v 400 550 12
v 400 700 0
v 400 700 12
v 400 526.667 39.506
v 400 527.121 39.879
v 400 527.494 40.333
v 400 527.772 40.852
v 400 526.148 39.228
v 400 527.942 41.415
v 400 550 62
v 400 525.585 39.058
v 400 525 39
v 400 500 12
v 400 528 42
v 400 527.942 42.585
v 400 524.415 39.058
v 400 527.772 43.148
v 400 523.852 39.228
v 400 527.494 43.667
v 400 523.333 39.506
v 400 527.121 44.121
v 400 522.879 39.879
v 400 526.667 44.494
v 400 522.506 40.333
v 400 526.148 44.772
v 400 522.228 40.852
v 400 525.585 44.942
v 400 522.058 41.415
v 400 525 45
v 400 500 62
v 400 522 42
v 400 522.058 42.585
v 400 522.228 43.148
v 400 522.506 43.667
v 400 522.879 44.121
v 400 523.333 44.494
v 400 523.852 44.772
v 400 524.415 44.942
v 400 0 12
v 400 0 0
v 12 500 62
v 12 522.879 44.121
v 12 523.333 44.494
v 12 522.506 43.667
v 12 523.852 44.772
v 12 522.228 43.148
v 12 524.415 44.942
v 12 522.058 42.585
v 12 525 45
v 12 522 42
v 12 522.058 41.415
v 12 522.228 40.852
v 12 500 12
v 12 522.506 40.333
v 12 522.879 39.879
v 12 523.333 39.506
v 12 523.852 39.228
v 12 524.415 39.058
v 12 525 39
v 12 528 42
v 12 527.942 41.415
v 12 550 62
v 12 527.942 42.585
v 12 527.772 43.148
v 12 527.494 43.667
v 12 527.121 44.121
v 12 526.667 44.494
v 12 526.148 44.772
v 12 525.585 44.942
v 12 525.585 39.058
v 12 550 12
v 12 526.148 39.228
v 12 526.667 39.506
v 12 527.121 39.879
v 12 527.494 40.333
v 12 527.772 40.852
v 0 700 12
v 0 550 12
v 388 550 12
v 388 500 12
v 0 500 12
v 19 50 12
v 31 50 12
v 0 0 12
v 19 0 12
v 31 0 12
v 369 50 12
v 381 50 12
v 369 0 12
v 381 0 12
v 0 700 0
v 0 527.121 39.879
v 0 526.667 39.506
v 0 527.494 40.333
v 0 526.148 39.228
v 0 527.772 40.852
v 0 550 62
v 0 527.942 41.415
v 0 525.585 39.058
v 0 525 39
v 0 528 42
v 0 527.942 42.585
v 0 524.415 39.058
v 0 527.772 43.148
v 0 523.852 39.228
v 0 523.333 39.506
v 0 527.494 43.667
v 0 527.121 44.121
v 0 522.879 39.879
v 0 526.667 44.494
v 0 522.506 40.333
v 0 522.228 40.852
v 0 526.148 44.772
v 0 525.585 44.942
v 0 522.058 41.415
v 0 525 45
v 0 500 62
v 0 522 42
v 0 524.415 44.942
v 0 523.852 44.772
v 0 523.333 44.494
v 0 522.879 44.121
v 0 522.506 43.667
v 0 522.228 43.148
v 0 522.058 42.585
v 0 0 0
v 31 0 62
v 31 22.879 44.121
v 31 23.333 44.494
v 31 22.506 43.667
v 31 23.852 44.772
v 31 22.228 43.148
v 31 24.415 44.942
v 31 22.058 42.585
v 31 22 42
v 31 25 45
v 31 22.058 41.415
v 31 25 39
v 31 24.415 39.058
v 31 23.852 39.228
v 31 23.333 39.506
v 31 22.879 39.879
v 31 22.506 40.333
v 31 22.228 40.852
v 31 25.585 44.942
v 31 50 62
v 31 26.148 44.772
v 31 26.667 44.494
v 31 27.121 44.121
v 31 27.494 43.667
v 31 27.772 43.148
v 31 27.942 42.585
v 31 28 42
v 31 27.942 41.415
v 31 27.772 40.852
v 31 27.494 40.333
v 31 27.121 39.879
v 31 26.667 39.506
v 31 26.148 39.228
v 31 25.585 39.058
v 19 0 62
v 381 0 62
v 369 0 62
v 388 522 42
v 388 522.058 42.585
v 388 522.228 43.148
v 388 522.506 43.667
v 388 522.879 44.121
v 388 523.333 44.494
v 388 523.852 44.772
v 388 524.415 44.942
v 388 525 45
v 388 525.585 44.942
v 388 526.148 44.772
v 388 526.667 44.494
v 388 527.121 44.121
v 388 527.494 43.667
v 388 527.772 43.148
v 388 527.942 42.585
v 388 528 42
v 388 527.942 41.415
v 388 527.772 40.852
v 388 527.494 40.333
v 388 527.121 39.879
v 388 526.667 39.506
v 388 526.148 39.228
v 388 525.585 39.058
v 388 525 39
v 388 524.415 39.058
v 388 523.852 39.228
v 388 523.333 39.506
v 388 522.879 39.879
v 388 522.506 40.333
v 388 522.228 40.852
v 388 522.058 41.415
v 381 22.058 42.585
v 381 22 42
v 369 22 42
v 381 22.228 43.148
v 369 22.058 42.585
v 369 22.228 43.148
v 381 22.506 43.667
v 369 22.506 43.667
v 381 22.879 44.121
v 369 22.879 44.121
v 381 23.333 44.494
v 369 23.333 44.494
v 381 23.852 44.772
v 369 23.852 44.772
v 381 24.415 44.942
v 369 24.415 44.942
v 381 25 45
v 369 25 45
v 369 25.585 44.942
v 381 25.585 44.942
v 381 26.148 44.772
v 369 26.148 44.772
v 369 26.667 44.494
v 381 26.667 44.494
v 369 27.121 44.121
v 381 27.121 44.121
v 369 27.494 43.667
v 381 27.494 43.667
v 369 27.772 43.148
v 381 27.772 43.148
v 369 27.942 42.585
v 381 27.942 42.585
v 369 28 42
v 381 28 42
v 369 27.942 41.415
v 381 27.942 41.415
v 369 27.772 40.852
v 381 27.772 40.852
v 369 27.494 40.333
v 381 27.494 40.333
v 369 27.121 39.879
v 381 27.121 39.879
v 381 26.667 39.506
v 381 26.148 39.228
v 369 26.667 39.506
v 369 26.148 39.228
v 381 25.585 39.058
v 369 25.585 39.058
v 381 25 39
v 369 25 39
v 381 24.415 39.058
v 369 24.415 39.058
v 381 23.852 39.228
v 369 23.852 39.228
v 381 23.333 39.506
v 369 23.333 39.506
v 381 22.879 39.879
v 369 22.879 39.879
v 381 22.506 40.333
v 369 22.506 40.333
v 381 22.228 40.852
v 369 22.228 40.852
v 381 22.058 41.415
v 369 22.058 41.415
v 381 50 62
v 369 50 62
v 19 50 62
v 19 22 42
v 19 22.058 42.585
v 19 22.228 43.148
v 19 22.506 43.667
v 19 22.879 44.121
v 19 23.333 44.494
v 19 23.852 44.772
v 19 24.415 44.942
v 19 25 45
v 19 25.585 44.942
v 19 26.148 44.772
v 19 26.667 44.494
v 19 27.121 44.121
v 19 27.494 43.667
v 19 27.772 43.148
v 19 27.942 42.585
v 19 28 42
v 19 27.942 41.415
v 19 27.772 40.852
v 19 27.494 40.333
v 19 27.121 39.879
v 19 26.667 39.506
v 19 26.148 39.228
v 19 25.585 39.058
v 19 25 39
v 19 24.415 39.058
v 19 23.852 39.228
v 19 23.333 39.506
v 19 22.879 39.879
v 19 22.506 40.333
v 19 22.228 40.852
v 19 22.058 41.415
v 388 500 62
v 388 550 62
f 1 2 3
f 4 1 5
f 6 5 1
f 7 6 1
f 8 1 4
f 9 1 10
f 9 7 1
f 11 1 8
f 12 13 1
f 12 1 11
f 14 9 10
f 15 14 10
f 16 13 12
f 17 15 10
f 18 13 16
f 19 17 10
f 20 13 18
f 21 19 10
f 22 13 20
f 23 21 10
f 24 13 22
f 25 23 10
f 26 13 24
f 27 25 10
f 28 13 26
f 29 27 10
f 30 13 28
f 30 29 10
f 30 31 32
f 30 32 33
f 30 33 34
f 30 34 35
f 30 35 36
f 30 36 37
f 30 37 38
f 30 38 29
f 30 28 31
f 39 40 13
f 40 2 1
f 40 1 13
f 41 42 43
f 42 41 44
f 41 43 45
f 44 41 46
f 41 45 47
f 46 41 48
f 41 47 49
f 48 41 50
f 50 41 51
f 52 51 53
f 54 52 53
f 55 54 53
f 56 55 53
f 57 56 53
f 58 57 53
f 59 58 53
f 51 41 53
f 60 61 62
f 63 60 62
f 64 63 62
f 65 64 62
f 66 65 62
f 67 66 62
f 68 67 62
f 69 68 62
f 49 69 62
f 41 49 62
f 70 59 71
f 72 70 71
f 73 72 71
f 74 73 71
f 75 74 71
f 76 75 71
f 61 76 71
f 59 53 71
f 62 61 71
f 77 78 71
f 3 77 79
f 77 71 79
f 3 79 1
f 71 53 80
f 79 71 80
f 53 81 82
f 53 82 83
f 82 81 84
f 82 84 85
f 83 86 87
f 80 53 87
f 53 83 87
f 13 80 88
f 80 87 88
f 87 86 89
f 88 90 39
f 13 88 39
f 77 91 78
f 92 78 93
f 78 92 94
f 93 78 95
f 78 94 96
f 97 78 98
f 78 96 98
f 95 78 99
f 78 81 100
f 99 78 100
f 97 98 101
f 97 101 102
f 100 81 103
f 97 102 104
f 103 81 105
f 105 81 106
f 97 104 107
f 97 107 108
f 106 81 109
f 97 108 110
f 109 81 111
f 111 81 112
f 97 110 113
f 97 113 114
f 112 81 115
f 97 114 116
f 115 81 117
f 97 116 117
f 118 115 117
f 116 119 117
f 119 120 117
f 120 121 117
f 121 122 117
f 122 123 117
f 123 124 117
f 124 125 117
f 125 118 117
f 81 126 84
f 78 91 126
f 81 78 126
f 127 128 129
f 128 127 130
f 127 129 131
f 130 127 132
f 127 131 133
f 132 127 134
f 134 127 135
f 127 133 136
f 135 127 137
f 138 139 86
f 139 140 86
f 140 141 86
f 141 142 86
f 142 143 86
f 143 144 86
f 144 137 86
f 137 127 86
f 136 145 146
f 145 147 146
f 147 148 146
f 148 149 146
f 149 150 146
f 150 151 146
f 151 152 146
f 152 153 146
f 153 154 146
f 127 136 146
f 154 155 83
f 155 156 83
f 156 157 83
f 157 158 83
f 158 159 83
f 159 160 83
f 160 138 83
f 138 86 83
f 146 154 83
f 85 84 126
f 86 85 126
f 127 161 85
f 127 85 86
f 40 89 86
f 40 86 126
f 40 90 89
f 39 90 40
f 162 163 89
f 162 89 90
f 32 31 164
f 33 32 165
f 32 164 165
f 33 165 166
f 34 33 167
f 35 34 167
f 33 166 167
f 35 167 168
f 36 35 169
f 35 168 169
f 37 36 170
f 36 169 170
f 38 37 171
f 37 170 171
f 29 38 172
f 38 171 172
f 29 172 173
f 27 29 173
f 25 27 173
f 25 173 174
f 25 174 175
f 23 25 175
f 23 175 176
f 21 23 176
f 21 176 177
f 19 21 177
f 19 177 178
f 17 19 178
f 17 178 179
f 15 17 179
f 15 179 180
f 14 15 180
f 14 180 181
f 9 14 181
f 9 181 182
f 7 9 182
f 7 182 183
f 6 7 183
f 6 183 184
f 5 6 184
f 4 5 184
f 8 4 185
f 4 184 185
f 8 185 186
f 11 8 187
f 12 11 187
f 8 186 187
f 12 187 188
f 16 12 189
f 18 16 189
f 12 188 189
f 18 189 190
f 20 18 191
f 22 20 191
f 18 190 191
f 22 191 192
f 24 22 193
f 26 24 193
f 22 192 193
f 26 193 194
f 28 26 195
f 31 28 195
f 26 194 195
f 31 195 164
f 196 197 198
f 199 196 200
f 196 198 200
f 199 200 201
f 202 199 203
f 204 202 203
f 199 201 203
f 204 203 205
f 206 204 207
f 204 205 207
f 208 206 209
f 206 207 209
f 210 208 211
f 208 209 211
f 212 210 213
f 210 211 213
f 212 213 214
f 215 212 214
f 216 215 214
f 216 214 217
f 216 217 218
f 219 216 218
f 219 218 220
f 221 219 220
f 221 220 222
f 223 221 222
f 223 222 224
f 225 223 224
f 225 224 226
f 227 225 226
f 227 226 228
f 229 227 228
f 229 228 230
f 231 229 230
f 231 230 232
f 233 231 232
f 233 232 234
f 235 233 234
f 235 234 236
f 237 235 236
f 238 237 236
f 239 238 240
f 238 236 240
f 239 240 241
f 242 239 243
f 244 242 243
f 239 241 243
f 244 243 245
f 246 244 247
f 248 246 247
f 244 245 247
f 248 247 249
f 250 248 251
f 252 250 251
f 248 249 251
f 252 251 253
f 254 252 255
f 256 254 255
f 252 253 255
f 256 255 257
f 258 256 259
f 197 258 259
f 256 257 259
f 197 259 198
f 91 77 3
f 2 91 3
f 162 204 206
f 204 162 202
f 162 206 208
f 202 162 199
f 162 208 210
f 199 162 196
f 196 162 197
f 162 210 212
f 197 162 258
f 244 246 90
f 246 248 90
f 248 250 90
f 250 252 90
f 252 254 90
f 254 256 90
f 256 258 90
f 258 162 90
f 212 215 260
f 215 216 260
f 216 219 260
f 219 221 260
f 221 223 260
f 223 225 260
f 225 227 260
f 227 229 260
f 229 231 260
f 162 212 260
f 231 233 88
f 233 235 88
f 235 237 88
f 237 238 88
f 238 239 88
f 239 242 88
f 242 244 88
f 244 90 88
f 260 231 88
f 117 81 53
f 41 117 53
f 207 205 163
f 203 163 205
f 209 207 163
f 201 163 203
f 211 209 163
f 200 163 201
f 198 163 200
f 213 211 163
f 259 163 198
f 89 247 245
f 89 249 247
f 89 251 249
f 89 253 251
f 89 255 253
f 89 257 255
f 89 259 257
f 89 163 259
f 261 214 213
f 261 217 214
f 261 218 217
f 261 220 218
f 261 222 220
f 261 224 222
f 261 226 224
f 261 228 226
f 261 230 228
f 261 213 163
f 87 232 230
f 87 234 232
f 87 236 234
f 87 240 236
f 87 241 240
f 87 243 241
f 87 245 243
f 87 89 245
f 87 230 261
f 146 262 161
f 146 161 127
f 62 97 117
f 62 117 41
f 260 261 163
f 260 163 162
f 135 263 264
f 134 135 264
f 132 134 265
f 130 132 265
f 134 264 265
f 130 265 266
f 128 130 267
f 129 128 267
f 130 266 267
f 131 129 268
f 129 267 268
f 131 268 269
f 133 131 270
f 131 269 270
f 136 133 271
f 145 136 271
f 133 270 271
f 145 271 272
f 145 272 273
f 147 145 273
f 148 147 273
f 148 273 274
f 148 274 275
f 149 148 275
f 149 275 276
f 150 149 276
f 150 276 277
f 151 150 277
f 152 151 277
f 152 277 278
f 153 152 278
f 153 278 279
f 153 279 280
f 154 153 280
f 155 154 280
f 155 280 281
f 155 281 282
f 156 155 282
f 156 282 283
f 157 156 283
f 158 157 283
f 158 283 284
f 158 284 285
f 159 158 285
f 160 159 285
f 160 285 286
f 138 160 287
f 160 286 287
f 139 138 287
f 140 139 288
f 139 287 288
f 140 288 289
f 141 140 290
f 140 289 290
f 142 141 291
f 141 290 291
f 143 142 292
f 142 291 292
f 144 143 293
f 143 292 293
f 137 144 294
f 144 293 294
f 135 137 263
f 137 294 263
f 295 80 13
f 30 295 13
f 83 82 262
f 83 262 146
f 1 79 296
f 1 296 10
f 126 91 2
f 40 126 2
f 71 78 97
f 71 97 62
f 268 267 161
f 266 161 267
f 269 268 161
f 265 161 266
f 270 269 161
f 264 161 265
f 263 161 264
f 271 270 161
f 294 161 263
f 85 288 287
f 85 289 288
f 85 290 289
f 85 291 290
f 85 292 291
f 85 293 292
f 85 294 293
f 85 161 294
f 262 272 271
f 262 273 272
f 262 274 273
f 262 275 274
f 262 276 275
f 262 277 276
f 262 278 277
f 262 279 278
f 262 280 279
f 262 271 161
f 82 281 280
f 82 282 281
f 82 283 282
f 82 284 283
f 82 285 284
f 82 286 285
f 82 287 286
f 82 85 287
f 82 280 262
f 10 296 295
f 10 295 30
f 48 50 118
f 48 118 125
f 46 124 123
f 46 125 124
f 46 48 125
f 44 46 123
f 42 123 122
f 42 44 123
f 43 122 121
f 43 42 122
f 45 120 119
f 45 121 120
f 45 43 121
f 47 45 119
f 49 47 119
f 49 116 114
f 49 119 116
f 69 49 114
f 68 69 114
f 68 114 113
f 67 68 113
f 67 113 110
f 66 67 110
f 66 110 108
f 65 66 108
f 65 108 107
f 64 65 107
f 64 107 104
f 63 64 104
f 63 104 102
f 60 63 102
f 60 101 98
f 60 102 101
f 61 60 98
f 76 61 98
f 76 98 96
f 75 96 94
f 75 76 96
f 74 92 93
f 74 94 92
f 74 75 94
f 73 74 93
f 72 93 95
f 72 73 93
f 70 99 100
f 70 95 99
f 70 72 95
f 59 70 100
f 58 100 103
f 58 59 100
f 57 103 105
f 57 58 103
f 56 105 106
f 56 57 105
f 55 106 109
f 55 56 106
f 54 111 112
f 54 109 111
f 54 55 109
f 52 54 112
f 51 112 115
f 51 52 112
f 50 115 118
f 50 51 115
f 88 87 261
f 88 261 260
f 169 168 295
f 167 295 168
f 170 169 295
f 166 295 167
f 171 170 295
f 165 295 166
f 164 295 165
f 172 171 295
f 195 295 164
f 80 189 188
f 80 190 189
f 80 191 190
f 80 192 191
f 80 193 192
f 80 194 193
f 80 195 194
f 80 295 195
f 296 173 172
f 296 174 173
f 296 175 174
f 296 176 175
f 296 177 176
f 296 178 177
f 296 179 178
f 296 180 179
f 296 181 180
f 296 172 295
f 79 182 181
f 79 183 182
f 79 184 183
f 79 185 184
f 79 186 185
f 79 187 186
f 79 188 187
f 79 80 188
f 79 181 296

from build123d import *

# Parameters (mm, degrees)
F0_W          = 400
F0_H          = 12
F1_DEPTH      = 700
F2_W          = 12
F2_H          = 50
F3_DEPTH      = 50
F4_R          = 3
F5_DEPTH      = 381.001
F5_DEPTH_BACK = 19.001


with BuildPart() as f1:
    # F0 (on Front) → F1 (new body)
    with BuildSketch(Plane.XZ):
        with Locations((200, 6)):
            Rectangle(F0_W, F0_H)
    extrude(amount=-F1_DEPTH)

    # F2 (on face) → F3 (join)
    with BuildSketch(Plane.XY.offset(12)):
        with Locations((25, 25)):
            Rectangle(F2_W, F2_H)
        with Locations((375, 25)):
            Rectangle(F2_W, F2_H)
        with Locations((6, 525)):
            Rectangle(F2_W, F2_H)
        with Locations((394, 525)):
            Rectangle(F2_W, F2_H)
    extrude(amount=F3_DEPTH)

    # F4 (on face) → F5 (cut, two sides)
    with BuildSketch(Plane(origin=(19, 0, 0), x_dir=(0, -1, 0), z_dir=(-1, 0, 0))) as f5_sk:
        with Locations((-25, 42)):
            Circle(F4_R)
        with Locations((-525, 42)):
            Circle(F4_R)
    extrude(amount=-F5_DEPTH, mode=Mode.SUBTRACT)
    extrude(f5_sk.sketch, amount=F5_DEPTH_BACK, mode=Mode.SUBTRACT)


solid = f1.part
